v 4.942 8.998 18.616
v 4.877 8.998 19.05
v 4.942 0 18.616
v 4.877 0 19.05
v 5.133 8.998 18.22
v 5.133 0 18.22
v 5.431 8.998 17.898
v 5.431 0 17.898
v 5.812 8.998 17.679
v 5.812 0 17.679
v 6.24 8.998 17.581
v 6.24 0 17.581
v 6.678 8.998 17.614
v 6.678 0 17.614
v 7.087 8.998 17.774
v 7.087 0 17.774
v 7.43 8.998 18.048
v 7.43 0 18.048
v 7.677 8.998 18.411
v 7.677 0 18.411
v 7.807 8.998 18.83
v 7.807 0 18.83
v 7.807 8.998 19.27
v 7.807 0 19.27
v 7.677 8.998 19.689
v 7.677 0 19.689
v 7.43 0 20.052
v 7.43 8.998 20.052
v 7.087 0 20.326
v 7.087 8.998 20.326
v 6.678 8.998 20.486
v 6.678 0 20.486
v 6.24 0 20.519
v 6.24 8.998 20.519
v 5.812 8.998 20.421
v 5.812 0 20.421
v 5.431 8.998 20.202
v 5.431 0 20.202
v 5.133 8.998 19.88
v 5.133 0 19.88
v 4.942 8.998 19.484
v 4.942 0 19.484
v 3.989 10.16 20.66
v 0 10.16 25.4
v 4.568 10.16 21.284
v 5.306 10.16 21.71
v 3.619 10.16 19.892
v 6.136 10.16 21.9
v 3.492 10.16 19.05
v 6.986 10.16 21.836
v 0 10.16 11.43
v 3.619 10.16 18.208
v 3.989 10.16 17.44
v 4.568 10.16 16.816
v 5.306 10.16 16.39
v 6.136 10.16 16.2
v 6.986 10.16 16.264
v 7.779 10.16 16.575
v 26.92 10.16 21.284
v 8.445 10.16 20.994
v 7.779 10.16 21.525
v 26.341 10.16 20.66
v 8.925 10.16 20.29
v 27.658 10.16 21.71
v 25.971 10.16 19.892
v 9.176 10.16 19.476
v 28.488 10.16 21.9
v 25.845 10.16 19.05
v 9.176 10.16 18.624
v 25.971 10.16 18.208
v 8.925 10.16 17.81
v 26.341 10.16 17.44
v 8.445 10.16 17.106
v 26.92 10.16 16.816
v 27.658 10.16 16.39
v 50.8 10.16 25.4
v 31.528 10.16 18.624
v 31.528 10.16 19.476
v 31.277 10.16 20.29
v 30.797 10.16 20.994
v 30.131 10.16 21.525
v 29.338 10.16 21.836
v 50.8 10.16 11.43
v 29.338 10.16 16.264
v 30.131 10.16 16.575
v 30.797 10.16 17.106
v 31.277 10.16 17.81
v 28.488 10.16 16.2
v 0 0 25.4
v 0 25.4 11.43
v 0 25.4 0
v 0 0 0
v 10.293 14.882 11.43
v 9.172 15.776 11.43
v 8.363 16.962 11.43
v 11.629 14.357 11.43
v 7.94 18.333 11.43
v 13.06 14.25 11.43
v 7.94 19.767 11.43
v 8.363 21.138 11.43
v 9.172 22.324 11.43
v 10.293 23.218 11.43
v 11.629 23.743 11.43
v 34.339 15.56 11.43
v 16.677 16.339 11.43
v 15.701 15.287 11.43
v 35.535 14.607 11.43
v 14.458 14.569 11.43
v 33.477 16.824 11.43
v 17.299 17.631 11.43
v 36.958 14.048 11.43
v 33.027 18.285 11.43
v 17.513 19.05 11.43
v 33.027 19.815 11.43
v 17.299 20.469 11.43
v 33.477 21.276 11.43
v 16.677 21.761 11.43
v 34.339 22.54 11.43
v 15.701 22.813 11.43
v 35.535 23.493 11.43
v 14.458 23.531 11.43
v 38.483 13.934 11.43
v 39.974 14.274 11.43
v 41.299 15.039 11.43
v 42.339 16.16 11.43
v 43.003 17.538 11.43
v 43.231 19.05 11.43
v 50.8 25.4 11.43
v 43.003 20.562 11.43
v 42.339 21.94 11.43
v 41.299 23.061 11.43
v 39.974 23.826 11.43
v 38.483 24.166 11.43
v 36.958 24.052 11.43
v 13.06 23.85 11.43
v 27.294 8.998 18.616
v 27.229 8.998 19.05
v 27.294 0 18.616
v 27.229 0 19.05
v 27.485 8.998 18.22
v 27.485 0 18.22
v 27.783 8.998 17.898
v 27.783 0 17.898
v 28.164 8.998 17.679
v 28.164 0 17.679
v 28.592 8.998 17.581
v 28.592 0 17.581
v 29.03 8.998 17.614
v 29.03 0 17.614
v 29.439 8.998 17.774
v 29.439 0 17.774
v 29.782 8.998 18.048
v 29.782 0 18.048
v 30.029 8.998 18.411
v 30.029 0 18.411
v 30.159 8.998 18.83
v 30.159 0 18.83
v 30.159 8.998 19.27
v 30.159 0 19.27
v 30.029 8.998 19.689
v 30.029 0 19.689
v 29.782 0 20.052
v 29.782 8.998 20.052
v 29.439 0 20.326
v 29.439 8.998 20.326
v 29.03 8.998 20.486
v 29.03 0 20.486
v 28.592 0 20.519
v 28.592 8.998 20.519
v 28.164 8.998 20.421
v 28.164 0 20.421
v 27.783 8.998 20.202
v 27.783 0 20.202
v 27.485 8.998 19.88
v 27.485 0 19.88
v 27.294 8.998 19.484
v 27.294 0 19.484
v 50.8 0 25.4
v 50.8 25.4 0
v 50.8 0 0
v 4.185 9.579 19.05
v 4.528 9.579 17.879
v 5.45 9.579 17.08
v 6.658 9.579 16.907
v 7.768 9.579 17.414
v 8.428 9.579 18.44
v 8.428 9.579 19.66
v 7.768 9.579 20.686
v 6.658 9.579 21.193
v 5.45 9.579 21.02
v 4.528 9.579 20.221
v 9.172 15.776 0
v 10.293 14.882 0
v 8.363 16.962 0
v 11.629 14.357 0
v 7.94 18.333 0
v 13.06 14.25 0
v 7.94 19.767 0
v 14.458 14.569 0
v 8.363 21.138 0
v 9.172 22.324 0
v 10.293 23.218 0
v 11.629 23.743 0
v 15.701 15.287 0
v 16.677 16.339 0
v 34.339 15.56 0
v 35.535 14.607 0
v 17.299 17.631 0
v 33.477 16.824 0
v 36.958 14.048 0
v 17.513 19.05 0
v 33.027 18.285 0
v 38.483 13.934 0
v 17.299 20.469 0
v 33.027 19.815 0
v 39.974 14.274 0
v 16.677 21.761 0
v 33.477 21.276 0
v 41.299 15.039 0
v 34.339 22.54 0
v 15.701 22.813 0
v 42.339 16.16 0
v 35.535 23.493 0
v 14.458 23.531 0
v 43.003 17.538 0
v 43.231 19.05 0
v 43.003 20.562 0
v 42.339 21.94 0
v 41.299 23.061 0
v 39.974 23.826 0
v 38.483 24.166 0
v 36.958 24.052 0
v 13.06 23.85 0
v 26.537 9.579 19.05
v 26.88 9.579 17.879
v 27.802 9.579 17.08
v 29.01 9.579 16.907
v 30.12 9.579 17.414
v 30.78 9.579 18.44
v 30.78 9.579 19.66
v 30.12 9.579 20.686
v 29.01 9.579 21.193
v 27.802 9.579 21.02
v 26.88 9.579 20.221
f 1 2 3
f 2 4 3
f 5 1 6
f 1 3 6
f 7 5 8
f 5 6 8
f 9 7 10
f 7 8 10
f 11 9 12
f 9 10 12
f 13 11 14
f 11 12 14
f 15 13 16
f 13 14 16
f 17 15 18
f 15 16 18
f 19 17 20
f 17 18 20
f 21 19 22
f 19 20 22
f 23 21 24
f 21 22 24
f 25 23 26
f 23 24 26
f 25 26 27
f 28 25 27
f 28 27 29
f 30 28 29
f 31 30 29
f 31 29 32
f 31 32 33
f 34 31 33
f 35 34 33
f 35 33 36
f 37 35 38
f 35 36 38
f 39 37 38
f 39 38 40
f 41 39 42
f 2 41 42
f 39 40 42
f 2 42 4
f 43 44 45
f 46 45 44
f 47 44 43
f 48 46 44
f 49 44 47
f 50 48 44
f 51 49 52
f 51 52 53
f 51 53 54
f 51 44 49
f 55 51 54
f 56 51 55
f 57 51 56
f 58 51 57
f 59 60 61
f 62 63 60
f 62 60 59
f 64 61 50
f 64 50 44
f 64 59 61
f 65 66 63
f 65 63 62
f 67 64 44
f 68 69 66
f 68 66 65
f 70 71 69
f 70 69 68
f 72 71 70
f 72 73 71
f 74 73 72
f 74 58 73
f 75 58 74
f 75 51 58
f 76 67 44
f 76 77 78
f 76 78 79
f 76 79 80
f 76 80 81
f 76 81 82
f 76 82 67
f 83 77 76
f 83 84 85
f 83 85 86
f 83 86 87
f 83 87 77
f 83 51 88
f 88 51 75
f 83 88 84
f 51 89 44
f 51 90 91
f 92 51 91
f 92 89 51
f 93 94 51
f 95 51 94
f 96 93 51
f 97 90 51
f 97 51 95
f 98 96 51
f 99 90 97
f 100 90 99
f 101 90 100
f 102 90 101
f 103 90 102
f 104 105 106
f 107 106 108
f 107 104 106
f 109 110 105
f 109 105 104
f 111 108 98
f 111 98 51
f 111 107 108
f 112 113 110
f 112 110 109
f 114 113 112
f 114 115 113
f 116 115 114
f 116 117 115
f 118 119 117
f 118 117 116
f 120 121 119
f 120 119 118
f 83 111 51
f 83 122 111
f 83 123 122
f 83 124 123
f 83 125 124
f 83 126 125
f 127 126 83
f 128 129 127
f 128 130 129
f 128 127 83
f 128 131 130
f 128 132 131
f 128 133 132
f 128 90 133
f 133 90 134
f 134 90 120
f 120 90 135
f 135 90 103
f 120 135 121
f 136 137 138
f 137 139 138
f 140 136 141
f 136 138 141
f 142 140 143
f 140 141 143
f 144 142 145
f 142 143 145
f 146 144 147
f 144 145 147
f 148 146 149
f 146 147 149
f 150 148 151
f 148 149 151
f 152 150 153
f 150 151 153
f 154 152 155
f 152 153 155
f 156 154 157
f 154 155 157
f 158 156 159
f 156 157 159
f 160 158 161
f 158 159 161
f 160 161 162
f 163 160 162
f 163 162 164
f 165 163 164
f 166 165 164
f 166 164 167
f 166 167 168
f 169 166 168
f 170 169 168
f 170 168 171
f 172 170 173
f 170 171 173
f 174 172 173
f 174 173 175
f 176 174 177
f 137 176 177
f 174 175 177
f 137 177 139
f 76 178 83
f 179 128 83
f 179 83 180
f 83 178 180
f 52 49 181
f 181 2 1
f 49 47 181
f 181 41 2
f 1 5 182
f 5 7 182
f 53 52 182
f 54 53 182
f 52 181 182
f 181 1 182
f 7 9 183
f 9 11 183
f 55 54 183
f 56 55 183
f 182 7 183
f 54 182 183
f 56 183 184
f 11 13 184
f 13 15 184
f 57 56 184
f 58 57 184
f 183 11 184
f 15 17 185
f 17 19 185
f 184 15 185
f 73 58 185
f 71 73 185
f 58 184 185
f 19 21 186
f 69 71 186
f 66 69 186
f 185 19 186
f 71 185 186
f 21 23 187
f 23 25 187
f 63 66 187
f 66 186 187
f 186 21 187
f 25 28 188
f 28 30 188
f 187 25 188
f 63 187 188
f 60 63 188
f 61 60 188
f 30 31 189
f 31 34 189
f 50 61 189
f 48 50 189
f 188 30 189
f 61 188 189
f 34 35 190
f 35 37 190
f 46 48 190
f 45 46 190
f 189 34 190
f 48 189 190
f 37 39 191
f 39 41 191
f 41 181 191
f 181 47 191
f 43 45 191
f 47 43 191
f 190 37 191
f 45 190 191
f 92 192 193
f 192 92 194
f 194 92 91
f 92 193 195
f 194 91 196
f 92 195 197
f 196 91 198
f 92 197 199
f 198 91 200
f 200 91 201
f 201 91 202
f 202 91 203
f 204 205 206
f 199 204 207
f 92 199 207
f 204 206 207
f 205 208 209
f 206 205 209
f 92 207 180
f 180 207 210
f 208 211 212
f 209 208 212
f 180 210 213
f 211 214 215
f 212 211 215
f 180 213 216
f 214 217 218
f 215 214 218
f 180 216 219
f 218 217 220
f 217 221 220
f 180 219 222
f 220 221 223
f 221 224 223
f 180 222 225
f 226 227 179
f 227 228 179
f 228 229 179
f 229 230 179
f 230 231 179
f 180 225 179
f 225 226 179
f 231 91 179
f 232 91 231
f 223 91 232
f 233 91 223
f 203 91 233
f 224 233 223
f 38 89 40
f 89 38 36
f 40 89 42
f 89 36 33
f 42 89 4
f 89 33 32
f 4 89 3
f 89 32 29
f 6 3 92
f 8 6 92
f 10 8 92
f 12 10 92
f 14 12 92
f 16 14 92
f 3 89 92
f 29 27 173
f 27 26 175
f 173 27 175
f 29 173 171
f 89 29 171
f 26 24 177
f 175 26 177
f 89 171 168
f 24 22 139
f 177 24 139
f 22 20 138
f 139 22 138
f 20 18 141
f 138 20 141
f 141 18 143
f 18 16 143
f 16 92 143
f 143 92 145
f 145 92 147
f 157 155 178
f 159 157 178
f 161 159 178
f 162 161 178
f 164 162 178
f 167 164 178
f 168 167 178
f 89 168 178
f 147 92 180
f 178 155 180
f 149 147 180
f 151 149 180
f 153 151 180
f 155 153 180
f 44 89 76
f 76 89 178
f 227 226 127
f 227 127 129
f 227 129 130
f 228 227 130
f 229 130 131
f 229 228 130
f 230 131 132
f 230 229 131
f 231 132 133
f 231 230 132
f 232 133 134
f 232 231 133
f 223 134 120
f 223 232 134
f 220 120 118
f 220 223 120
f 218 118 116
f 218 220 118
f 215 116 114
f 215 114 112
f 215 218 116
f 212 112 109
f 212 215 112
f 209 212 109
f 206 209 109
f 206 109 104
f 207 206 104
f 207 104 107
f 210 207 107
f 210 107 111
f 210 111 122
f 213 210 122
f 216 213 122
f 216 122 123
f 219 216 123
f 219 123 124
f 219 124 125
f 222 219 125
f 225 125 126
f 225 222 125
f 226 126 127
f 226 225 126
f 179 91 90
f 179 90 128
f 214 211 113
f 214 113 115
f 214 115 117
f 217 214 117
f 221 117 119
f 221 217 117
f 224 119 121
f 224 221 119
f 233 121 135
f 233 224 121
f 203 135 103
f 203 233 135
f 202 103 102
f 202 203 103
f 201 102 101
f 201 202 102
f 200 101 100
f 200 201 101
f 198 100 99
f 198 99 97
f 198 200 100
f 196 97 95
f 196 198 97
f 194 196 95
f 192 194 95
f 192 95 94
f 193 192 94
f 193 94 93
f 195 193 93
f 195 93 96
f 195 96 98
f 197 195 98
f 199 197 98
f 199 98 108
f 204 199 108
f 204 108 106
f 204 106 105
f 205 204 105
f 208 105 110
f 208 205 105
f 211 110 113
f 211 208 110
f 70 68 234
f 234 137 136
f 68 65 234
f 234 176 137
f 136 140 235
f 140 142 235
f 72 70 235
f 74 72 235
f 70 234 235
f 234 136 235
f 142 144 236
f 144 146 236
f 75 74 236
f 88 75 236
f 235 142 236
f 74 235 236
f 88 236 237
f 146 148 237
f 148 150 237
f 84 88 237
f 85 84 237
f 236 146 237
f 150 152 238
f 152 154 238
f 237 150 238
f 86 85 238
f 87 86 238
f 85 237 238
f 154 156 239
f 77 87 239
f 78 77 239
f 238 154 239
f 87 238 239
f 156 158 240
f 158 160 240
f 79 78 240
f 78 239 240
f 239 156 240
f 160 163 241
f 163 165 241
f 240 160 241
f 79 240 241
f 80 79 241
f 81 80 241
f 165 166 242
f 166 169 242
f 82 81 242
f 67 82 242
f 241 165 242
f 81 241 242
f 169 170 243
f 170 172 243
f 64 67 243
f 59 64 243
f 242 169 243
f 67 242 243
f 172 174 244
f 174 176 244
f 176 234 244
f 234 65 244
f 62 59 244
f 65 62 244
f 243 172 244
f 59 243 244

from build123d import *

# Parameters (mm, degrees)
SKETCH1_W                                         = 50.8
SKETCH1_H                                         = 25.4
SKETCH1_R                                         = 4.8133
SKETCH1_R_2                                       = 5.1308
BOSS_EXTRUDE1_DEPTH                               = 11.43
SKETCH2_W                                         = 50.8
SKETCH2_H                                         = 25.4
BOSS_EXTRUDE2_DEPTH                               = 10.16
CSK_FOR_4_FLAT_HEAD_MACHINE_SCREW_100_D           = 2.9464
CSK_FOR_4_FLAT_HEAD_MACHINE_SCREW_100_CSINK_D     = 5.715
CSK_FOR_4_FLAT_HEAD_MACHINE_SCREW_100_CSINK_ANGLE = 100


with BuildPart() as part:
    # Sketch1 → Boss-Extrude1 (new body)
    with BuildSketch(Plane.XY):
        with Locations((25.4, 12.7)):
            Rectangle(SKETCH1_W, SKETCH1_H)
        with Locations((12.7, 19.05)):
            Circle(SKETCH1_R, mode=Mode.SUBTRACT)
        with Locations((38.1, 19.05)):
            Circle(SKETCH1_R_2, mode=Mode.SUBTRACT)
    extrude(amount=BOSS_EXTRUDE1_DEPTH)

    # Sketch2 → Boss-Extrude2 (add)
    with BuildSketch(Plane(origin=(0, 0, 0), x_dir=(1, 0, 0), z_dir=(0, 1, 0))):
        with Locations((25.4, -12.7)):
            Rectangle(SKETCH2_W, SKETCH2_H)
    extrude(amount=BOSS_EXTRUDE2_DEPTH)

    # CSK for #4 Flat Head Machine Screw (100)1 (through all)
    with Locations(Plane(origin=(0, 10.16, 0), x_dir=(1, 0, 0), z_dir=(0, 1, 0))):
        with Locations((28.702, -19.05), (6.35, -19.05)):
            CounterSinkHole(CSK_FOR_4_FLAT_HEAD_MACHINE_SCREW_100_D / 2, CSK_FOR_4_FLAT_HEAD_MACHINE_SCREW_100_CSINK_D / 2, counter_sink_angle=CSK_FOR_4_FLAT_HEAD_MACHINE_SCREW_100_CSINK_ANGLE)


solid = part.part
